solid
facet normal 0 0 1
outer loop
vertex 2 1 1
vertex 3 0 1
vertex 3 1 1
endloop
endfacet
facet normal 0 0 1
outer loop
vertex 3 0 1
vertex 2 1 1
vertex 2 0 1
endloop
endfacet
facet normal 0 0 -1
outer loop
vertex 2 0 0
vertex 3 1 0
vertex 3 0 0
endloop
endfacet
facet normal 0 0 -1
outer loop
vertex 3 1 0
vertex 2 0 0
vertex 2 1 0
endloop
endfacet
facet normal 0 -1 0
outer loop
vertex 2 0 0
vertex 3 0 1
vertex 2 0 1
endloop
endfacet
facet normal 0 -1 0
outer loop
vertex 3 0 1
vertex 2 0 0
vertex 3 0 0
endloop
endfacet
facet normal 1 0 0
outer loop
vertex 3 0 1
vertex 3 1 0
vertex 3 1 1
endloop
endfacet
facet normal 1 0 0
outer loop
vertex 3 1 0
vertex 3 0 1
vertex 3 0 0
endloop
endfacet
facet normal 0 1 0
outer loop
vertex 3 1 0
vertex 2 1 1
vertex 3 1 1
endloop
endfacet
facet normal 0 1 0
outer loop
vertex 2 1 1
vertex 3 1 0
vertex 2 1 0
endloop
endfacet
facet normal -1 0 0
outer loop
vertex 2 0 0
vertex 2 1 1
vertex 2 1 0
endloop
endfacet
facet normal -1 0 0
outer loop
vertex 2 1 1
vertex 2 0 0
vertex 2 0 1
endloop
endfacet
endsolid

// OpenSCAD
color(c=[1,0,0,1.0]){ translate(v=[2.0,0.0,0.0]){
cube(size=[1.0,1.0,1.0], center=false);
} }
